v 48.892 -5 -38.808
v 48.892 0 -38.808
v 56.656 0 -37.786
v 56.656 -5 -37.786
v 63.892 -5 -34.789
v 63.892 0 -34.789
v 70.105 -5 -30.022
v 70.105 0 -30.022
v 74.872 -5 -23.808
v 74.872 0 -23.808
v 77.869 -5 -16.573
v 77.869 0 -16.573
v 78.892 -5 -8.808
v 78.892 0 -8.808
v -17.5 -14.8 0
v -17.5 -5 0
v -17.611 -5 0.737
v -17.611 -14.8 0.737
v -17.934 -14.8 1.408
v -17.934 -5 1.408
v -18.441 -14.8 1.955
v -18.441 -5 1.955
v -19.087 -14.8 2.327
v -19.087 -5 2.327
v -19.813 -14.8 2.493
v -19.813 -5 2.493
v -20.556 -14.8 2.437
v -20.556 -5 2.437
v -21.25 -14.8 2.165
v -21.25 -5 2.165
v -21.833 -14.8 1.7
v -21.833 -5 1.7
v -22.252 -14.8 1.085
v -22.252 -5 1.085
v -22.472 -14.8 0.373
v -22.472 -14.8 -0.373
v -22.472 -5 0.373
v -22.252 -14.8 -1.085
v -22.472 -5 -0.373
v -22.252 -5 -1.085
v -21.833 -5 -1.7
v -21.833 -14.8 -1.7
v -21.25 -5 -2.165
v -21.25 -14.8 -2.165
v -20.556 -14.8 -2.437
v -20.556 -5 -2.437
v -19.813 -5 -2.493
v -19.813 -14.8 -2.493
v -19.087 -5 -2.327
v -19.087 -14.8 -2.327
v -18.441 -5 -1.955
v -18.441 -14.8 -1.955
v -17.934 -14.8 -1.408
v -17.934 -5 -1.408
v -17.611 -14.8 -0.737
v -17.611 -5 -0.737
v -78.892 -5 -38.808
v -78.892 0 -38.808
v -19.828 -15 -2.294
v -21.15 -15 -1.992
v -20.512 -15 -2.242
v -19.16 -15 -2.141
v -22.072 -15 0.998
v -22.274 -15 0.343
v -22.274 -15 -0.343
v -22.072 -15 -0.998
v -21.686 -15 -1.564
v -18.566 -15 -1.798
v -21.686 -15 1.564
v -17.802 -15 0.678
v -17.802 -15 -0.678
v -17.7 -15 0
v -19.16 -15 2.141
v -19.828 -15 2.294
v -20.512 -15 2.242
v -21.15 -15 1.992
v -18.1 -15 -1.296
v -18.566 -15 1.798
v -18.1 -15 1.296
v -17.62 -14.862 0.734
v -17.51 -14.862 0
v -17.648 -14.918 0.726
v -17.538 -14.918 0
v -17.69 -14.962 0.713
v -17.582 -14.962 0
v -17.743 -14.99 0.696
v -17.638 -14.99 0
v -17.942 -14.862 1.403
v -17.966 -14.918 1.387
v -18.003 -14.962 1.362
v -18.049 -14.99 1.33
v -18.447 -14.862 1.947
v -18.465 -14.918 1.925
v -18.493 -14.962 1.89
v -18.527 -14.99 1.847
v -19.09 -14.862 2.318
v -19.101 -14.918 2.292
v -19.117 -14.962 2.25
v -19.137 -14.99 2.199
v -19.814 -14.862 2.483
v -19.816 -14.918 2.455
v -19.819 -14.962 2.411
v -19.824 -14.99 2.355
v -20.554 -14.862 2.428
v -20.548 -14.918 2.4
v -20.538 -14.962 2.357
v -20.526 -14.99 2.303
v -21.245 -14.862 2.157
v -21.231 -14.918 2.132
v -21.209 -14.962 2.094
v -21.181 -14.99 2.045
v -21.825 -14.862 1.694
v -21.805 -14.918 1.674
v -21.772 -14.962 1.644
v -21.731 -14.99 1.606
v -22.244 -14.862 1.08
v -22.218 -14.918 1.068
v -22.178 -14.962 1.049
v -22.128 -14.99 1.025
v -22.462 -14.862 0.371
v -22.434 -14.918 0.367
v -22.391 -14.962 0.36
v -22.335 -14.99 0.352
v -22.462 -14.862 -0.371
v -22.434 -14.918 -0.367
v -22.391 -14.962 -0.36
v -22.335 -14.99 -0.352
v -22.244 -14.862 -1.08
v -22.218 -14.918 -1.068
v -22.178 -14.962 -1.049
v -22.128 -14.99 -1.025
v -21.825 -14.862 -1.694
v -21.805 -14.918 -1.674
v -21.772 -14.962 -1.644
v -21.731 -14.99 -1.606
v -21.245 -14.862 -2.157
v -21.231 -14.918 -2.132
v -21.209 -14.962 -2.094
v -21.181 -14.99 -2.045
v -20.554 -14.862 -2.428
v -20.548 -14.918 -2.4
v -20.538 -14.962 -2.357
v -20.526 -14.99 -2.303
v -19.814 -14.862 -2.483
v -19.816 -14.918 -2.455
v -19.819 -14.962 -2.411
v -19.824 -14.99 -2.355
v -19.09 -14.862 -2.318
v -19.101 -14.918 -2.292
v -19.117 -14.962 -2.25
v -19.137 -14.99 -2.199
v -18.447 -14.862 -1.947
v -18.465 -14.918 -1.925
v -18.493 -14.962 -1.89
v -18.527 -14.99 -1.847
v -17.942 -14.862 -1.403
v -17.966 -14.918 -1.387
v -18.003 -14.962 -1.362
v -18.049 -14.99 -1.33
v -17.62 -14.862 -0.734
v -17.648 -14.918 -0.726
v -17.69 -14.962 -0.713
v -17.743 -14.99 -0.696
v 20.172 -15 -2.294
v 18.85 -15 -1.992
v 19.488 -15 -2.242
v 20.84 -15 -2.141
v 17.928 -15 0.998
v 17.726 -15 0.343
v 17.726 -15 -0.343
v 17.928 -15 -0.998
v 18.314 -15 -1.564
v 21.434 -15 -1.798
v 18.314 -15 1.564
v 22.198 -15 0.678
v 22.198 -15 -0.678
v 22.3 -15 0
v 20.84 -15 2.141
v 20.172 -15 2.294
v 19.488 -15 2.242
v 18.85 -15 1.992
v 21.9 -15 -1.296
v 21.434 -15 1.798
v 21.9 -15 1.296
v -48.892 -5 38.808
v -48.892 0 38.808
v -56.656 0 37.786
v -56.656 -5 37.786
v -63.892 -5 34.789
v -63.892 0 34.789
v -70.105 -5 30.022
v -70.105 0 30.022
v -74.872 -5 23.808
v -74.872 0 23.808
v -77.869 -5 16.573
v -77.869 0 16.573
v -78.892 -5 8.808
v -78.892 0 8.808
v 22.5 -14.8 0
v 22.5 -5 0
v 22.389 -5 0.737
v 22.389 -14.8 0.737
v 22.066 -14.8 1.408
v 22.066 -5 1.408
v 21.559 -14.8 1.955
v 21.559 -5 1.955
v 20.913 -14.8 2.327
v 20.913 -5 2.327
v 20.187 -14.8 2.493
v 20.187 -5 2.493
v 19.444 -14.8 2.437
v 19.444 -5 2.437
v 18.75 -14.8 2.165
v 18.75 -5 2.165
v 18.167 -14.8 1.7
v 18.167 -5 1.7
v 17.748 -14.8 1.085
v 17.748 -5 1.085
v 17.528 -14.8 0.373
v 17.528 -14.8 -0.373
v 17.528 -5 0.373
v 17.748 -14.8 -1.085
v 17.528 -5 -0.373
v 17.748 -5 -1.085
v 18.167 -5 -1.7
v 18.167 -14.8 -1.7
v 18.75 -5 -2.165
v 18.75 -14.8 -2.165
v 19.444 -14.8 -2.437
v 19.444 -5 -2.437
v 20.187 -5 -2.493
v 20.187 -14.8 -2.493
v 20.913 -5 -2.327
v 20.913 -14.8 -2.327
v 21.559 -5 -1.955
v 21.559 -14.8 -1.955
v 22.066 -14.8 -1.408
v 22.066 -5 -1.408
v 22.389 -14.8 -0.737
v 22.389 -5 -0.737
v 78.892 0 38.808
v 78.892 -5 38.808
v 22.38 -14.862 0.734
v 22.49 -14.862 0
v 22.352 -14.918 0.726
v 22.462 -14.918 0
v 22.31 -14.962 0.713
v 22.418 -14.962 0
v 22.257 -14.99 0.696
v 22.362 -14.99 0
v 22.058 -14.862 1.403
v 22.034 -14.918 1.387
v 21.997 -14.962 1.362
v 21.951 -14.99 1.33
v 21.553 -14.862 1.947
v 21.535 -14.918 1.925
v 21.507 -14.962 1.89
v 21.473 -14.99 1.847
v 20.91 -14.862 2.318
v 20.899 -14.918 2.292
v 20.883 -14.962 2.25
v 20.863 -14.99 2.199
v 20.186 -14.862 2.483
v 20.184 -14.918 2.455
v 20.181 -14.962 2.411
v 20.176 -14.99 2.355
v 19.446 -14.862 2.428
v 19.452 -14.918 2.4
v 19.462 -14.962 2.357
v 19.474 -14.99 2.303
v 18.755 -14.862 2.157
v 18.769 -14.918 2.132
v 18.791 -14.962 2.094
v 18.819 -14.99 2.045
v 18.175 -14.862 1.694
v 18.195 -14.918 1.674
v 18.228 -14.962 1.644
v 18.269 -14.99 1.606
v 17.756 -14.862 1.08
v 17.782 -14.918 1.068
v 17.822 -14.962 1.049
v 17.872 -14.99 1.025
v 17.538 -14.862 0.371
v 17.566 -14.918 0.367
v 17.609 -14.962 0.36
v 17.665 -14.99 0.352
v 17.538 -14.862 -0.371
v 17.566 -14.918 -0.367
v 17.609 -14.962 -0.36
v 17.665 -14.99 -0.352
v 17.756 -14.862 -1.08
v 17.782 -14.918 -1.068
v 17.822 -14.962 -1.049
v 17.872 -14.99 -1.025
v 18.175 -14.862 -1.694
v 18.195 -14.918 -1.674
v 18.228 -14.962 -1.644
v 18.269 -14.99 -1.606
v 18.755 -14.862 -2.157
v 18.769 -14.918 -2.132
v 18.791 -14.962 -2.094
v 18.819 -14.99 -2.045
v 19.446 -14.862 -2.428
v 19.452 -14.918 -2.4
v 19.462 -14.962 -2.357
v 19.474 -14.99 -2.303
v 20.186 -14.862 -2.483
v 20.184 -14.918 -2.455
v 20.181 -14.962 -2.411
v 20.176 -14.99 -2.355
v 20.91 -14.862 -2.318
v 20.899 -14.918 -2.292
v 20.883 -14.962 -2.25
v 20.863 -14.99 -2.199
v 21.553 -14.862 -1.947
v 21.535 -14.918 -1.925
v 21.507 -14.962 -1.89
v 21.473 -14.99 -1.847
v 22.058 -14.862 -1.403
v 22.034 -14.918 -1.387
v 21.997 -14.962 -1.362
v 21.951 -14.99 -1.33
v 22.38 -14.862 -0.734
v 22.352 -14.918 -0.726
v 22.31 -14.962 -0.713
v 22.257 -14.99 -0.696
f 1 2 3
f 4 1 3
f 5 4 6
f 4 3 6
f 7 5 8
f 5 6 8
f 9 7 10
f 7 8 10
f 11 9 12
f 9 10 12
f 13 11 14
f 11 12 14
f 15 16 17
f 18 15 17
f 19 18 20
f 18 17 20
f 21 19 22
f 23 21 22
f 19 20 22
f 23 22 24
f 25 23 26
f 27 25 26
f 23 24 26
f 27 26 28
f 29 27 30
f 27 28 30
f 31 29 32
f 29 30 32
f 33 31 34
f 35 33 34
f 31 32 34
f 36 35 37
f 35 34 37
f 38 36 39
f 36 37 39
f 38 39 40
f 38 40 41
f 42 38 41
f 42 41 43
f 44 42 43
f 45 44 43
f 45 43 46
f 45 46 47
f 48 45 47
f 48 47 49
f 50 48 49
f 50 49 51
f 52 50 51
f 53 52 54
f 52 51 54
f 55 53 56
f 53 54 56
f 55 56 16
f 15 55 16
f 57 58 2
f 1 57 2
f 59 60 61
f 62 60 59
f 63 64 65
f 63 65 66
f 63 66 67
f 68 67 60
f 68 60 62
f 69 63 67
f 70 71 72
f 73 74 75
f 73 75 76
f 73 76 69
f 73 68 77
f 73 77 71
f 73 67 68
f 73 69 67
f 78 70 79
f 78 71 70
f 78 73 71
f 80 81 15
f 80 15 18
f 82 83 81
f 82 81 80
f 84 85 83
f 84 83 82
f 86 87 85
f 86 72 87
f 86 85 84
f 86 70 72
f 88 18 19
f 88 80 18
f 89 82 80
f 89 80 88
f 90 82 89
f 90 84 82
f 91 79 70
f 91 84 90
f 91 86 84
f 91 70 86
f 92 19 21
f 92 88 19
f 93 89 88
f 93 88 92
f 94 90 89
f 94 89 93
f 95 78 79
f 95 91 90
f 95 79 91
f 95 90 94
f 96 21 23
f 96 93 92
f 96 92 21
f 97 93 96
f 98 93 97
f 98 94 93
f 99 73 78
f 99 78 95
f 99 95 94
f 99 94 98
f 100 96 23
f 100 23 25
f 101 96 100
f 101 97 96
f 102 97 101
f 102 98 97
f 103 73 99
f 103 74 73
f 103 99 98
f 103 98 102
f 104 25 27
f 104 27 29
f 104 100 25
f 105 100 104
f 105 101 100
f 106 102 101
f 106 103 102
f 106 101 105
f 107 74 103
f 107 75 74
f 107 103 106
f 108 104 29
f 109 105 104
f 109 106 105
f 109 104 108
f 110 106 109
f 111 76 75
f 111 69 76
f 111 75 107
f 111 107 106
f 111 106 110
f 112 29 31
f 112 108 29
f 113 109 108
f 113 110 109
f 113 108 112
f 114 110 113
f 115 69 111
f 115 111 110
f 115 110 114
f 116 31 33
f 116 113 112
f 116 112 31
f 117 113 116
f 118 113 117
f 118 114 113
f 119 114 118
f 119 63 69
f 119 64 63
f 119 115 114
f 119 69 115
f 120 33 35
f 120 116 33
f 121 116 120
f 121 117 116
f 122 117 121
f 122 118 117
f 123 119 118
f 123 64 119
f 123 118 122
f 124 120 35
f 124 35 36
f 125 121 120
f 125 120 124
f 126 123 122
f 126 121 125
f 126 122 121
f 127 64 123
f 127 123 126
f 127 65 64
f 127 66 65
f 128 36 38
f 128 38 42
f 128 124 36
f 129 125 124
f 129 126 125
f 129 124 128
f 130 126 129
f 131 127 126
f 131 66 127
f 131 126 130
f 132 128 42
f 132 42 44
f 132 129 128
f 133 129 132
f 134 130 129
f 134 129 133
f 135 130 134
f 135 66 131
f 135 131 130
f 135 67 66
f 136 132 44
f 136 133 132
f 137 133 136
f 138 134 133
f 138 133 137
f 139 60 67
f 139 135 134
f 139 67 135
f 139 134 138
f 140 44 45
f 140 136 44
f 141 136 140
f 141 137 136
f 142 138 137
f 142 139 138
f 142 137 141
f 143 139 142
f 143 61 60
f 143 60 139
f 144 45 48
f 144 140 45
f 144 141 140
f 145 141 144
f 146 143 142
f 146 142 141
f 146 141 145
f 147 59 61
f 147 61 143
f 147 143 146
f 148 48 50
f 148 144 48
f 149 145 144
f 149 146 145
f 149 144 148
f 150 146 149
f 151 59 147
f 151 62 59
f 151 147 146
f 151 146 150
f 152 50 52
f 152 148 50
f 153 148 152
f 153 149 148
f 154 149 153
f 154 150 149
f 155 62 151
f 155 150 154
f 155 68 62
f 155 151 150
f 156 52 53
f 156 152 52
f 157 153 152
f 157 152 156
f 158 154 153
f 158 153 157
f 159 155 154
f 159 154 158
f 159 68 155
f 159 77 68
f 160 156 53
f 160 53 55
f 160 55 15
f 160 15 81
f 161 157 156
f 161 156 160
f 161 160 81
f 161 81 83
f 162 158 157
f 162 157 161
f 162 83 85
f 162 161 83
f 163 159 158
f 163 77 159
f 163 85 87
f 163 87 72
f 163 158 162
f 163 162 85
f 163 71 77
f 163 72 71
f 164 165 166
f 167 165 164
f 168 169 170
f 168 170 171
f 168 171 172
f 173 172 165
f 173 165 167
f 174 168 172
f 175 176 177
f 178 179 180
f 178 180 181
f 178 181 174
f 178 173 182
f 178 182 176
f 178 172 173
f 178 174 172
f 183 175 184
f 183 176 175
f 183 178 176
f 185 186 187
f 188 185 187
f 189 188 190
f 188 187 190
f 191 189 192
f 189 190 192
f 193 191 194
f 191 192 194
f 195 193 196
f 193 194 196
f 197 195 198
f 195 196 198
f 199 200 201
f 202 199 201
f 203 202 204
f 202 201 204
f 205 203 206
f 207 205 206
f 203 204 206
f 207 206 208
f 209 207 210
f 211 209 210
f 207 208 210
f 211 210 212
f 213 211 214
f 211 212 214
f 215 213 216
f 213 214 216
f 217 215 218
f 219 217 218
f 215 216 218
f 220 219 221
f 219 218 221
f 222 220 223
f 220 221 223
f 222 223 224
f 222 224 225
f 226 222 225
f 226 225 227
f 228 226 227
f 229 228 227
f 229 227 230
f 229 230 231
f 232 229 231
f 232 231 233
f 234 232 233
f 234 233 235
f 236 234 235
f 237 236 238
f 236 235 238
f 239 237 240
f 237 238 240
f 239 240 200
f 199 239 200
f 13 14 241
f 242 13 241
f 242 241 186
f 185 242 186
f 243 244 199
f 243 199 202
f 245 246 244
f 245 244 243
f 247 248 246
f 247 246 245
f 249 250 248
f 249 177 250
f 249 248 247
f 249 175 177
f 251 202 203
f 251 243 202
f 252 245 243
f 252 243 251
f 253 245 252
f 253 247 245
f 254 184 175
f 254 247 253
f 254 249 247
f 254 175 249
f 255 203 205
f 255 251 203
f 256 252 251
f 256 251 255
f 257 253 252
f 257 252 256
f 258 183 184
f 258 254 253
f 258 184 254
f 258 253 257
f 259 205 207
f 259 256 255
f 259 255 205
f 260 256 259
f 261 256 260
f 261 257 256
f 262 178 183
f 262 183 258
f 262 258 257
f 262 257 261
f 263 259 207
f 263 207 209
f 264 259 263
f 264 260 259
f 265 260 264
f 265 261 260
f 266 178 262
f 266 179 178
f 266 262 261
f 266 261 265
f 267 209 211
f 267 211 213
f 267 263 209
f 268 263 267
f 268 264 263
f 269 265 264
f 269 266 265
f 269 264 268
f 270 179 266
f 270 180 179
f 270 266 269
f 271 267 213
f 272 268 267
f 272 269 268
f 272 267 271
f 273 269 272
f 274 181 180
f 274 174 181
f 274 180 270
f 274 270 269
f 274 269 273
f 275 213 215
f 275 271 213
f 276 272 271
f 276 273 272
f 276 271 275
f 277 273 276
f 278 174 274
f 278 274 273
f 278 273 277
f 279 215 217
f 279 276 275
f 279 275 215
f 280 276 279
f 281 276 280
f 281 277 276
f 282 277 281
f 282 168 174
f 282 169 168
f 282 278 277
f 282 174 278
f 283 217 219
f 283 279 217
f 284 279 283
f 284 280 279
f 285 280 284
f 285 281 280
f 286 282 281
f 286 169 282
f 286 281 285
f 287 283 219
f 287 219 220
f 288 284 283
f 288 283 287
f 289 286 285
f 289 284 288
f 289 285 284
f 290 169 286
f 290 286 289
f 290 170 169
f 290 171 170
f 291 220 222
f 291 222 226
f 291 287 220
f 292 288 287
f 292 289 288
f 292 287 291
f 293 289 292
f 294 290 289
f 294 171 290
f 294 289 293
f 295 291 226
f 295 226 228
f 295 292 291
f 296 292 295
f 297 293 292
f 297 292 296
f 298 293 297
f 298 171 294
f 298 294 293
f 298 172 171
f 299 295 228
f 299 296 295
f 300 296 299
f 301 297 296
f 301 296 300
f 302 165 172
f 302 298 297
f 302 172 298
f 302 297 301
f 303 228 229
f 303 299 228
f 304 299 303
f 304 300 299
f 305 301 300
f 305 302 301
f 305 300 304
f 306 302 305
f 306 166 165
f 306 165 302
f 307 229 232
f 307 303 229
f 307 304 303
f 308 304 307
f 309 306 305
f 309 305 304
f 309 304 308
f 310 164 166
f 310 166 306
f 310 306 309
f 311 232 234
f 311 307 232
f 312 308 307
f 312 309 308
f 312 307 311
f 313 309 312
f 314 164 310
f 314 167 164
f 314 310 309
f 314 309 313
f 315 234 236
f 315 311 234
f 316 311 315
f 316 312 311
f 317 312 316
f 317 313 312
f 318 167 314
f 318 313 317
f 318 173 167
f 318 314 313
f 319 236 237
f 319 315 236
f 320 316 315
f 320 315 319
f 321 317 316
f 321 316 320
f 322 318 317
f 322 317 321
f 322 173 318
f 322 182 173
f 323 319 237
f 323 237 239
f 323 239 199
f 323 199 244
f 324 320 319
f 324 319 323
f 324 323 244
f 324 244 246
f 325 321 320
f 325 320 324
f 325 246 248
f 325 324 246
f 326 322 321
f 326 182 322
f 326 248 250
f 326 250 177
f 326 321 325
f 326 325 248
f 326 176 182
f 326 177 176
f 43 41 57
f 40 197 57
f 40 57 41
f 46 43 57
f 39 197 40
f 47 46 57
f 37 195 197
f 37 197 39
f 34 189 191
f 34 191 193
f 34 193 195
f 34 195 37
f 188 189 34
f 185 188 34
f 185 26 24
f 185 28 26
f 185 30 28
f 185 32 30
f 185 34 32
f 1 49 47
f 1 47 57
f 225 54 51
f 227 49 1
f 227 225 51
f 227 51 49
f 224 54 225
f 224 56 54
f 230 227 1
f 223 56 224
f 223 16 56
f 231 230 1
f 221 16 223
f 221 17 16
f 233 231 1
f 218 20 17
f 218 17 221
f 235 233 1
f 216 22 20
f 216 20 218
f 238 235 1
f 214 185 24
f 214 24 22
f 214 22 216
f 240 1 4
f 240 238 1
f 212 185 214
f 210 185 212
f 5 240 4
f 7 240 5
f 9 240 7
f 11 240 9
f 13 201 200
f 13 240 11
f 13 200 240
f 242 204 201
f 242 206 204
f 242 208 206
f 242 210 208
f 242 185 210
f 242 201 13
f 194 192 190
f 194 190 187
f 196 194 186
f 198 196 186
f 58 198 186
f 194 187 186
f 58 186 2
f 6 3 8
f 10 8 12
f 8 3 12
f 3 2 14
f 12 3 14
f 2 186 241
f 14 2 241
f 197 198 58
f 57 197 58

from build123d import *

# Parameters (mm, degrees)
F1_DEPTH = 5
F2_R     = 2.5
F3_DEPTH = 10
F4_R     = 0.2


with BuildPart() as f1:
    # F0 (on Front) → F1 (new body)
    with BuildSketch(Plane.XZ):
        with BuildLine():
            Line((78.891635, -8.808454), (78.891635, 38.808454))
            Line((78.891635, 38.808454), (-48.891635, 38.808454))
            ThreePointArc((-48.891635, 38.808454), (-70.104838, 30.021657), (-78.891635, 8.808454))
            Line((-78.891635, 8.808454), (-78.891635, -38.808454))
            Line((-78.891635, -38.808454), (48.891635, -38.808454))
            ThreePointArc((48.891635, -38.808454), (70.104838, -30.021657), (78.891635, -8.808454))
        make_face()
    extrude(amount=F1_DEPTH)

    # F2 (on face) → F3 (join)
    with BuildSketch(Plane.XZ.offset(5)):
        with Locations((-20, 0)):
            Circle(F2_R)
        with Locations((20, 0)):
            Circle(F2_R)
    extrude(amount=F3_DEPTH)

    # F4
    f4_edges = [f1.edges().sort_by_distance(p)[0] for p in [
        (-22.5, -15, 0),
        (17.5, -15, 0),
    ]]
    fillet(f4_edges, radius=F4_R)


solid = f1.part
